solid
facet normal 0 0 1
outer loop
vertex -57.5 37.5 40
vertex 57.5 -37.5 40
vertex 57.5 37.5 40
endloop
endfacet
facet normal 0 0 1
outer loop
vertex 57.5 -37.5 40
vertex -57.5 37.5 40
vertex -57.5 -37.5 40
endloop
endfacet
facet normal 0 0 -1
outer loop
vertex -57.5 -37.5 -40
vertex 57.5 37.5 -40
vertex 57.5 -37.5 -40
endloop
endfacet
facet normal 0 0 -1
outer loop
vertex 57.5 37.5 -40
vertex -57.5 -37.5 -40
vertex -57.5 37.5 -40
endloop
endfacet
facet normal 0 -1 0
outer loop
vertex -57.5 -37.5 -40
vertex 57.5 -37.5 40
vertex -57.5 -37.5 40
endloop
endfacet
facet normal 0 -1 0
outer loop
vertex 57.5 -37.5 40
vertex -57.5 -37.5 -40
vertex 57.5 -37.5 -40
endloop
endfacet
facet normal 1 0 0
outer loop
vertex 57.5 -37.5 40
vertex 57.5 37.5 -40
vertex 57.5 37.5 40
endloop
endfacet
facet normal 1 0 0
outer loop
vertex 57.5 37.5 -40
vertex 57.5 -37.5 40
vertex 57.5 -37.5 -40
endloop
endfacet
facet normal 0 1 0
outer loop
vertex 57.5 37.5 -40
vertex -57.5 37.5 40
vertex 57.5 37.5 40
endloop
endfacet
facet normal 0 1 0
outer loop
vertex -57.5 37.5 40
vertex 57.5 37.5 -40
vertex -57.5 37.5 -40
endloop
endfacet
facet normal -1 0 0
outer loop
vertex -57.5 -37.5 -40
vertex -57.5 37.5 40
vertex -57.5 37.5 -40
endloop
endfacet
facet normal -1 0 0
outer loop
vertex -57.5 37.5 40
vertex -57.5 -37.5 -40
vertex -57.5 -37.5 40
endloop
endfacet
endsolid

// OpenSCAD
// ========================================
// a 115 x 75 x 80 mm box
// NeuroCAD canonical IR; dimensions are millimetres
// ========================================
$fn = 48;

cube(size=[115, 75, 80], center=true);
